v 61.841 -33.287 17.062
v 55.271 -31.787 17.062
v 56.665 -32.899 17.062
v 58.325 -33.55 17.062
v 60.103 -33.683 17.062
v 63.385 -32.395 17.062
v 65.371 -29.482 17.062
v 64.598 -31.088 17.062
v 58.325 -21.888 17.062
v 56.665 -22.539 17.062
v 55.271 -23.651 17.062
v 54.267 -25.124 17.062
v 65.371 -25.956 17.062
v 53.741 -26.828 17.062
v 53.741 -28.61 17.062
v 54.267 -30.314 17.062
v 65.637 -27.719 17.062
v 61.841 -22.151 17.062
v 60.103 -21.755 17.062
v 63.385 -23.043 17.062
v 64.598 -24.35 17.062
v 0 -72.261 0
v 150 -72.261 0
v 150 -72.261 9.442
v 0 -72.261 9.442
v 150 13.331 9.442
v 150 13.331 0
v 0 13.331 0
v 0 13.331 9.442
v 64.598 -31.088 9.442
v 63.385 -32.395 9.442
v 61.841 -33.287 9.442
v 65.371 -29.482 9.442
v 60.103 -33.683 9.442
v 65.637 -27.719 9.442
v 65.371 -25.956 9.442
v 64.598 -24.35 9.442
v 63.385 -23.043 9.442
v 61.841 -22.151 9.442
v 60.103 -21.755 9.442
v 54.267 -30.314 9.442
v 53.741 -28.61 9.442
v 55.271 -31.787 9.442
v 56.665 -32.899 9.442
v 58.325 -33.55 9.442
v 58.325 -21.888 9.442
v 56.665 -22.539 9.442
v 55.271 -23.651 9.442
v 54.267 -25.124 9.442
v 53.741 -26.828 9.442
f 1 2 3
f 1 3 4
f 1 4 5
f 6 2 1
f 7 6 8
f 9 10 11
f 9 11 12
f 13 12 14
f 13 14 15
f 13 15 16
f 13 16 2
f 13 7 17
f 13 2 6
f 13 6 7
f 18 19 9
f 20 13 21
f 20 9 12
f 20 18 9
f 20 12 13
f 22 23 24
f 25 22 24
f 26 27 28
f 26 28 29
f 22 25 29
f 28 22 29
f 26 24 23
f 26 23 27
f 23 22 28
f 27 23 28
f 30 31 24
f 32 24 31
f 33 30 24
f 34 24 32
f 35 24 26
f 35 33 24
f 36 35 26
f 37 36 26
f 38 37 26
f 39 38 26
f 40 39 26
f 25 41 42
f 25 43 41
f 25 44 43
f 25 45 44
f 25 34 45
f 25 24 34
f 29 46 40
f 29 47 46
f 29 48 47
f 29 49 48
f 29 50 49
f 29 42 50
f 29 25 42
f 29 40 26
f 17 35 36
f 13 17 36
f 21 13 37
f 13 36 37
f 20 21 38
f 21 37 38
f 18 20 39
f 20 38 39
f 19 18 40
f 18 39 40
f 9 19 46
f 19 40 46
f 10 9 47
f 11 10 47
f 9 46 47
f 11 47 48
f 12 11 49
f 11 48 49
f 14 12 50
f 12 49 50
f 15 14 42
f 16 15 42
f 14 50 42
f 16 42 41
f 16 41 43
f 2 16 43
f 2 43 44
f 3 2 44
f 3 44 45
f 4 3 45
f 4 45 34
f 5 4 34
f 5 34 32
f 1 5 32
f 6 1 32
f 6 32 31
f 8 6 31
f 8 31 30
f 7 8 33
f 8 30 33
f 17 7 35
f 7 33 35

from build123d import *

# Parameters (mm, degrees)
F0_W     = 85.5915052816
F0_H     = 9.4415829517
F1_DEPTH = 150
F2_DEPTH = 150
F4_R     = 5.981115506
F5_DEPTH = 7.62


# Not quite as in the source:
# - a feature of the source that left no trace in its solid (it failed there, or was rolled back) is left out


with BuildPart() as f1:
    # F0 (on Right) → F1 (new body)
    with BuildSketch(Plane.YZ):
        with Locations((-29.4651468284, 4.7207914758)):
            Rectangle(F0_W, F0_H)
    extrude(amount=F1_DEPTH)

    # F2 (cut): a face of the model
    f2_faces = [f1.faces().sort_by_distance(p)[0] for p in [
        (75, -72.2608994693, 4.7207914758),
    ]]
    extrude(f2_faces, amount=F2_DEPTH, mode=Mode.SUBTRACT)

    # F4 (on face) → F5 (join)
    with BuildSketch(Plane.XY.offset(9.4415829517)):
        with Locations((59.6557557583, -27.7189966291)):
            Circle(F4_R)
    extrude(amount=F5_DEPTH)


solid = f1.part
